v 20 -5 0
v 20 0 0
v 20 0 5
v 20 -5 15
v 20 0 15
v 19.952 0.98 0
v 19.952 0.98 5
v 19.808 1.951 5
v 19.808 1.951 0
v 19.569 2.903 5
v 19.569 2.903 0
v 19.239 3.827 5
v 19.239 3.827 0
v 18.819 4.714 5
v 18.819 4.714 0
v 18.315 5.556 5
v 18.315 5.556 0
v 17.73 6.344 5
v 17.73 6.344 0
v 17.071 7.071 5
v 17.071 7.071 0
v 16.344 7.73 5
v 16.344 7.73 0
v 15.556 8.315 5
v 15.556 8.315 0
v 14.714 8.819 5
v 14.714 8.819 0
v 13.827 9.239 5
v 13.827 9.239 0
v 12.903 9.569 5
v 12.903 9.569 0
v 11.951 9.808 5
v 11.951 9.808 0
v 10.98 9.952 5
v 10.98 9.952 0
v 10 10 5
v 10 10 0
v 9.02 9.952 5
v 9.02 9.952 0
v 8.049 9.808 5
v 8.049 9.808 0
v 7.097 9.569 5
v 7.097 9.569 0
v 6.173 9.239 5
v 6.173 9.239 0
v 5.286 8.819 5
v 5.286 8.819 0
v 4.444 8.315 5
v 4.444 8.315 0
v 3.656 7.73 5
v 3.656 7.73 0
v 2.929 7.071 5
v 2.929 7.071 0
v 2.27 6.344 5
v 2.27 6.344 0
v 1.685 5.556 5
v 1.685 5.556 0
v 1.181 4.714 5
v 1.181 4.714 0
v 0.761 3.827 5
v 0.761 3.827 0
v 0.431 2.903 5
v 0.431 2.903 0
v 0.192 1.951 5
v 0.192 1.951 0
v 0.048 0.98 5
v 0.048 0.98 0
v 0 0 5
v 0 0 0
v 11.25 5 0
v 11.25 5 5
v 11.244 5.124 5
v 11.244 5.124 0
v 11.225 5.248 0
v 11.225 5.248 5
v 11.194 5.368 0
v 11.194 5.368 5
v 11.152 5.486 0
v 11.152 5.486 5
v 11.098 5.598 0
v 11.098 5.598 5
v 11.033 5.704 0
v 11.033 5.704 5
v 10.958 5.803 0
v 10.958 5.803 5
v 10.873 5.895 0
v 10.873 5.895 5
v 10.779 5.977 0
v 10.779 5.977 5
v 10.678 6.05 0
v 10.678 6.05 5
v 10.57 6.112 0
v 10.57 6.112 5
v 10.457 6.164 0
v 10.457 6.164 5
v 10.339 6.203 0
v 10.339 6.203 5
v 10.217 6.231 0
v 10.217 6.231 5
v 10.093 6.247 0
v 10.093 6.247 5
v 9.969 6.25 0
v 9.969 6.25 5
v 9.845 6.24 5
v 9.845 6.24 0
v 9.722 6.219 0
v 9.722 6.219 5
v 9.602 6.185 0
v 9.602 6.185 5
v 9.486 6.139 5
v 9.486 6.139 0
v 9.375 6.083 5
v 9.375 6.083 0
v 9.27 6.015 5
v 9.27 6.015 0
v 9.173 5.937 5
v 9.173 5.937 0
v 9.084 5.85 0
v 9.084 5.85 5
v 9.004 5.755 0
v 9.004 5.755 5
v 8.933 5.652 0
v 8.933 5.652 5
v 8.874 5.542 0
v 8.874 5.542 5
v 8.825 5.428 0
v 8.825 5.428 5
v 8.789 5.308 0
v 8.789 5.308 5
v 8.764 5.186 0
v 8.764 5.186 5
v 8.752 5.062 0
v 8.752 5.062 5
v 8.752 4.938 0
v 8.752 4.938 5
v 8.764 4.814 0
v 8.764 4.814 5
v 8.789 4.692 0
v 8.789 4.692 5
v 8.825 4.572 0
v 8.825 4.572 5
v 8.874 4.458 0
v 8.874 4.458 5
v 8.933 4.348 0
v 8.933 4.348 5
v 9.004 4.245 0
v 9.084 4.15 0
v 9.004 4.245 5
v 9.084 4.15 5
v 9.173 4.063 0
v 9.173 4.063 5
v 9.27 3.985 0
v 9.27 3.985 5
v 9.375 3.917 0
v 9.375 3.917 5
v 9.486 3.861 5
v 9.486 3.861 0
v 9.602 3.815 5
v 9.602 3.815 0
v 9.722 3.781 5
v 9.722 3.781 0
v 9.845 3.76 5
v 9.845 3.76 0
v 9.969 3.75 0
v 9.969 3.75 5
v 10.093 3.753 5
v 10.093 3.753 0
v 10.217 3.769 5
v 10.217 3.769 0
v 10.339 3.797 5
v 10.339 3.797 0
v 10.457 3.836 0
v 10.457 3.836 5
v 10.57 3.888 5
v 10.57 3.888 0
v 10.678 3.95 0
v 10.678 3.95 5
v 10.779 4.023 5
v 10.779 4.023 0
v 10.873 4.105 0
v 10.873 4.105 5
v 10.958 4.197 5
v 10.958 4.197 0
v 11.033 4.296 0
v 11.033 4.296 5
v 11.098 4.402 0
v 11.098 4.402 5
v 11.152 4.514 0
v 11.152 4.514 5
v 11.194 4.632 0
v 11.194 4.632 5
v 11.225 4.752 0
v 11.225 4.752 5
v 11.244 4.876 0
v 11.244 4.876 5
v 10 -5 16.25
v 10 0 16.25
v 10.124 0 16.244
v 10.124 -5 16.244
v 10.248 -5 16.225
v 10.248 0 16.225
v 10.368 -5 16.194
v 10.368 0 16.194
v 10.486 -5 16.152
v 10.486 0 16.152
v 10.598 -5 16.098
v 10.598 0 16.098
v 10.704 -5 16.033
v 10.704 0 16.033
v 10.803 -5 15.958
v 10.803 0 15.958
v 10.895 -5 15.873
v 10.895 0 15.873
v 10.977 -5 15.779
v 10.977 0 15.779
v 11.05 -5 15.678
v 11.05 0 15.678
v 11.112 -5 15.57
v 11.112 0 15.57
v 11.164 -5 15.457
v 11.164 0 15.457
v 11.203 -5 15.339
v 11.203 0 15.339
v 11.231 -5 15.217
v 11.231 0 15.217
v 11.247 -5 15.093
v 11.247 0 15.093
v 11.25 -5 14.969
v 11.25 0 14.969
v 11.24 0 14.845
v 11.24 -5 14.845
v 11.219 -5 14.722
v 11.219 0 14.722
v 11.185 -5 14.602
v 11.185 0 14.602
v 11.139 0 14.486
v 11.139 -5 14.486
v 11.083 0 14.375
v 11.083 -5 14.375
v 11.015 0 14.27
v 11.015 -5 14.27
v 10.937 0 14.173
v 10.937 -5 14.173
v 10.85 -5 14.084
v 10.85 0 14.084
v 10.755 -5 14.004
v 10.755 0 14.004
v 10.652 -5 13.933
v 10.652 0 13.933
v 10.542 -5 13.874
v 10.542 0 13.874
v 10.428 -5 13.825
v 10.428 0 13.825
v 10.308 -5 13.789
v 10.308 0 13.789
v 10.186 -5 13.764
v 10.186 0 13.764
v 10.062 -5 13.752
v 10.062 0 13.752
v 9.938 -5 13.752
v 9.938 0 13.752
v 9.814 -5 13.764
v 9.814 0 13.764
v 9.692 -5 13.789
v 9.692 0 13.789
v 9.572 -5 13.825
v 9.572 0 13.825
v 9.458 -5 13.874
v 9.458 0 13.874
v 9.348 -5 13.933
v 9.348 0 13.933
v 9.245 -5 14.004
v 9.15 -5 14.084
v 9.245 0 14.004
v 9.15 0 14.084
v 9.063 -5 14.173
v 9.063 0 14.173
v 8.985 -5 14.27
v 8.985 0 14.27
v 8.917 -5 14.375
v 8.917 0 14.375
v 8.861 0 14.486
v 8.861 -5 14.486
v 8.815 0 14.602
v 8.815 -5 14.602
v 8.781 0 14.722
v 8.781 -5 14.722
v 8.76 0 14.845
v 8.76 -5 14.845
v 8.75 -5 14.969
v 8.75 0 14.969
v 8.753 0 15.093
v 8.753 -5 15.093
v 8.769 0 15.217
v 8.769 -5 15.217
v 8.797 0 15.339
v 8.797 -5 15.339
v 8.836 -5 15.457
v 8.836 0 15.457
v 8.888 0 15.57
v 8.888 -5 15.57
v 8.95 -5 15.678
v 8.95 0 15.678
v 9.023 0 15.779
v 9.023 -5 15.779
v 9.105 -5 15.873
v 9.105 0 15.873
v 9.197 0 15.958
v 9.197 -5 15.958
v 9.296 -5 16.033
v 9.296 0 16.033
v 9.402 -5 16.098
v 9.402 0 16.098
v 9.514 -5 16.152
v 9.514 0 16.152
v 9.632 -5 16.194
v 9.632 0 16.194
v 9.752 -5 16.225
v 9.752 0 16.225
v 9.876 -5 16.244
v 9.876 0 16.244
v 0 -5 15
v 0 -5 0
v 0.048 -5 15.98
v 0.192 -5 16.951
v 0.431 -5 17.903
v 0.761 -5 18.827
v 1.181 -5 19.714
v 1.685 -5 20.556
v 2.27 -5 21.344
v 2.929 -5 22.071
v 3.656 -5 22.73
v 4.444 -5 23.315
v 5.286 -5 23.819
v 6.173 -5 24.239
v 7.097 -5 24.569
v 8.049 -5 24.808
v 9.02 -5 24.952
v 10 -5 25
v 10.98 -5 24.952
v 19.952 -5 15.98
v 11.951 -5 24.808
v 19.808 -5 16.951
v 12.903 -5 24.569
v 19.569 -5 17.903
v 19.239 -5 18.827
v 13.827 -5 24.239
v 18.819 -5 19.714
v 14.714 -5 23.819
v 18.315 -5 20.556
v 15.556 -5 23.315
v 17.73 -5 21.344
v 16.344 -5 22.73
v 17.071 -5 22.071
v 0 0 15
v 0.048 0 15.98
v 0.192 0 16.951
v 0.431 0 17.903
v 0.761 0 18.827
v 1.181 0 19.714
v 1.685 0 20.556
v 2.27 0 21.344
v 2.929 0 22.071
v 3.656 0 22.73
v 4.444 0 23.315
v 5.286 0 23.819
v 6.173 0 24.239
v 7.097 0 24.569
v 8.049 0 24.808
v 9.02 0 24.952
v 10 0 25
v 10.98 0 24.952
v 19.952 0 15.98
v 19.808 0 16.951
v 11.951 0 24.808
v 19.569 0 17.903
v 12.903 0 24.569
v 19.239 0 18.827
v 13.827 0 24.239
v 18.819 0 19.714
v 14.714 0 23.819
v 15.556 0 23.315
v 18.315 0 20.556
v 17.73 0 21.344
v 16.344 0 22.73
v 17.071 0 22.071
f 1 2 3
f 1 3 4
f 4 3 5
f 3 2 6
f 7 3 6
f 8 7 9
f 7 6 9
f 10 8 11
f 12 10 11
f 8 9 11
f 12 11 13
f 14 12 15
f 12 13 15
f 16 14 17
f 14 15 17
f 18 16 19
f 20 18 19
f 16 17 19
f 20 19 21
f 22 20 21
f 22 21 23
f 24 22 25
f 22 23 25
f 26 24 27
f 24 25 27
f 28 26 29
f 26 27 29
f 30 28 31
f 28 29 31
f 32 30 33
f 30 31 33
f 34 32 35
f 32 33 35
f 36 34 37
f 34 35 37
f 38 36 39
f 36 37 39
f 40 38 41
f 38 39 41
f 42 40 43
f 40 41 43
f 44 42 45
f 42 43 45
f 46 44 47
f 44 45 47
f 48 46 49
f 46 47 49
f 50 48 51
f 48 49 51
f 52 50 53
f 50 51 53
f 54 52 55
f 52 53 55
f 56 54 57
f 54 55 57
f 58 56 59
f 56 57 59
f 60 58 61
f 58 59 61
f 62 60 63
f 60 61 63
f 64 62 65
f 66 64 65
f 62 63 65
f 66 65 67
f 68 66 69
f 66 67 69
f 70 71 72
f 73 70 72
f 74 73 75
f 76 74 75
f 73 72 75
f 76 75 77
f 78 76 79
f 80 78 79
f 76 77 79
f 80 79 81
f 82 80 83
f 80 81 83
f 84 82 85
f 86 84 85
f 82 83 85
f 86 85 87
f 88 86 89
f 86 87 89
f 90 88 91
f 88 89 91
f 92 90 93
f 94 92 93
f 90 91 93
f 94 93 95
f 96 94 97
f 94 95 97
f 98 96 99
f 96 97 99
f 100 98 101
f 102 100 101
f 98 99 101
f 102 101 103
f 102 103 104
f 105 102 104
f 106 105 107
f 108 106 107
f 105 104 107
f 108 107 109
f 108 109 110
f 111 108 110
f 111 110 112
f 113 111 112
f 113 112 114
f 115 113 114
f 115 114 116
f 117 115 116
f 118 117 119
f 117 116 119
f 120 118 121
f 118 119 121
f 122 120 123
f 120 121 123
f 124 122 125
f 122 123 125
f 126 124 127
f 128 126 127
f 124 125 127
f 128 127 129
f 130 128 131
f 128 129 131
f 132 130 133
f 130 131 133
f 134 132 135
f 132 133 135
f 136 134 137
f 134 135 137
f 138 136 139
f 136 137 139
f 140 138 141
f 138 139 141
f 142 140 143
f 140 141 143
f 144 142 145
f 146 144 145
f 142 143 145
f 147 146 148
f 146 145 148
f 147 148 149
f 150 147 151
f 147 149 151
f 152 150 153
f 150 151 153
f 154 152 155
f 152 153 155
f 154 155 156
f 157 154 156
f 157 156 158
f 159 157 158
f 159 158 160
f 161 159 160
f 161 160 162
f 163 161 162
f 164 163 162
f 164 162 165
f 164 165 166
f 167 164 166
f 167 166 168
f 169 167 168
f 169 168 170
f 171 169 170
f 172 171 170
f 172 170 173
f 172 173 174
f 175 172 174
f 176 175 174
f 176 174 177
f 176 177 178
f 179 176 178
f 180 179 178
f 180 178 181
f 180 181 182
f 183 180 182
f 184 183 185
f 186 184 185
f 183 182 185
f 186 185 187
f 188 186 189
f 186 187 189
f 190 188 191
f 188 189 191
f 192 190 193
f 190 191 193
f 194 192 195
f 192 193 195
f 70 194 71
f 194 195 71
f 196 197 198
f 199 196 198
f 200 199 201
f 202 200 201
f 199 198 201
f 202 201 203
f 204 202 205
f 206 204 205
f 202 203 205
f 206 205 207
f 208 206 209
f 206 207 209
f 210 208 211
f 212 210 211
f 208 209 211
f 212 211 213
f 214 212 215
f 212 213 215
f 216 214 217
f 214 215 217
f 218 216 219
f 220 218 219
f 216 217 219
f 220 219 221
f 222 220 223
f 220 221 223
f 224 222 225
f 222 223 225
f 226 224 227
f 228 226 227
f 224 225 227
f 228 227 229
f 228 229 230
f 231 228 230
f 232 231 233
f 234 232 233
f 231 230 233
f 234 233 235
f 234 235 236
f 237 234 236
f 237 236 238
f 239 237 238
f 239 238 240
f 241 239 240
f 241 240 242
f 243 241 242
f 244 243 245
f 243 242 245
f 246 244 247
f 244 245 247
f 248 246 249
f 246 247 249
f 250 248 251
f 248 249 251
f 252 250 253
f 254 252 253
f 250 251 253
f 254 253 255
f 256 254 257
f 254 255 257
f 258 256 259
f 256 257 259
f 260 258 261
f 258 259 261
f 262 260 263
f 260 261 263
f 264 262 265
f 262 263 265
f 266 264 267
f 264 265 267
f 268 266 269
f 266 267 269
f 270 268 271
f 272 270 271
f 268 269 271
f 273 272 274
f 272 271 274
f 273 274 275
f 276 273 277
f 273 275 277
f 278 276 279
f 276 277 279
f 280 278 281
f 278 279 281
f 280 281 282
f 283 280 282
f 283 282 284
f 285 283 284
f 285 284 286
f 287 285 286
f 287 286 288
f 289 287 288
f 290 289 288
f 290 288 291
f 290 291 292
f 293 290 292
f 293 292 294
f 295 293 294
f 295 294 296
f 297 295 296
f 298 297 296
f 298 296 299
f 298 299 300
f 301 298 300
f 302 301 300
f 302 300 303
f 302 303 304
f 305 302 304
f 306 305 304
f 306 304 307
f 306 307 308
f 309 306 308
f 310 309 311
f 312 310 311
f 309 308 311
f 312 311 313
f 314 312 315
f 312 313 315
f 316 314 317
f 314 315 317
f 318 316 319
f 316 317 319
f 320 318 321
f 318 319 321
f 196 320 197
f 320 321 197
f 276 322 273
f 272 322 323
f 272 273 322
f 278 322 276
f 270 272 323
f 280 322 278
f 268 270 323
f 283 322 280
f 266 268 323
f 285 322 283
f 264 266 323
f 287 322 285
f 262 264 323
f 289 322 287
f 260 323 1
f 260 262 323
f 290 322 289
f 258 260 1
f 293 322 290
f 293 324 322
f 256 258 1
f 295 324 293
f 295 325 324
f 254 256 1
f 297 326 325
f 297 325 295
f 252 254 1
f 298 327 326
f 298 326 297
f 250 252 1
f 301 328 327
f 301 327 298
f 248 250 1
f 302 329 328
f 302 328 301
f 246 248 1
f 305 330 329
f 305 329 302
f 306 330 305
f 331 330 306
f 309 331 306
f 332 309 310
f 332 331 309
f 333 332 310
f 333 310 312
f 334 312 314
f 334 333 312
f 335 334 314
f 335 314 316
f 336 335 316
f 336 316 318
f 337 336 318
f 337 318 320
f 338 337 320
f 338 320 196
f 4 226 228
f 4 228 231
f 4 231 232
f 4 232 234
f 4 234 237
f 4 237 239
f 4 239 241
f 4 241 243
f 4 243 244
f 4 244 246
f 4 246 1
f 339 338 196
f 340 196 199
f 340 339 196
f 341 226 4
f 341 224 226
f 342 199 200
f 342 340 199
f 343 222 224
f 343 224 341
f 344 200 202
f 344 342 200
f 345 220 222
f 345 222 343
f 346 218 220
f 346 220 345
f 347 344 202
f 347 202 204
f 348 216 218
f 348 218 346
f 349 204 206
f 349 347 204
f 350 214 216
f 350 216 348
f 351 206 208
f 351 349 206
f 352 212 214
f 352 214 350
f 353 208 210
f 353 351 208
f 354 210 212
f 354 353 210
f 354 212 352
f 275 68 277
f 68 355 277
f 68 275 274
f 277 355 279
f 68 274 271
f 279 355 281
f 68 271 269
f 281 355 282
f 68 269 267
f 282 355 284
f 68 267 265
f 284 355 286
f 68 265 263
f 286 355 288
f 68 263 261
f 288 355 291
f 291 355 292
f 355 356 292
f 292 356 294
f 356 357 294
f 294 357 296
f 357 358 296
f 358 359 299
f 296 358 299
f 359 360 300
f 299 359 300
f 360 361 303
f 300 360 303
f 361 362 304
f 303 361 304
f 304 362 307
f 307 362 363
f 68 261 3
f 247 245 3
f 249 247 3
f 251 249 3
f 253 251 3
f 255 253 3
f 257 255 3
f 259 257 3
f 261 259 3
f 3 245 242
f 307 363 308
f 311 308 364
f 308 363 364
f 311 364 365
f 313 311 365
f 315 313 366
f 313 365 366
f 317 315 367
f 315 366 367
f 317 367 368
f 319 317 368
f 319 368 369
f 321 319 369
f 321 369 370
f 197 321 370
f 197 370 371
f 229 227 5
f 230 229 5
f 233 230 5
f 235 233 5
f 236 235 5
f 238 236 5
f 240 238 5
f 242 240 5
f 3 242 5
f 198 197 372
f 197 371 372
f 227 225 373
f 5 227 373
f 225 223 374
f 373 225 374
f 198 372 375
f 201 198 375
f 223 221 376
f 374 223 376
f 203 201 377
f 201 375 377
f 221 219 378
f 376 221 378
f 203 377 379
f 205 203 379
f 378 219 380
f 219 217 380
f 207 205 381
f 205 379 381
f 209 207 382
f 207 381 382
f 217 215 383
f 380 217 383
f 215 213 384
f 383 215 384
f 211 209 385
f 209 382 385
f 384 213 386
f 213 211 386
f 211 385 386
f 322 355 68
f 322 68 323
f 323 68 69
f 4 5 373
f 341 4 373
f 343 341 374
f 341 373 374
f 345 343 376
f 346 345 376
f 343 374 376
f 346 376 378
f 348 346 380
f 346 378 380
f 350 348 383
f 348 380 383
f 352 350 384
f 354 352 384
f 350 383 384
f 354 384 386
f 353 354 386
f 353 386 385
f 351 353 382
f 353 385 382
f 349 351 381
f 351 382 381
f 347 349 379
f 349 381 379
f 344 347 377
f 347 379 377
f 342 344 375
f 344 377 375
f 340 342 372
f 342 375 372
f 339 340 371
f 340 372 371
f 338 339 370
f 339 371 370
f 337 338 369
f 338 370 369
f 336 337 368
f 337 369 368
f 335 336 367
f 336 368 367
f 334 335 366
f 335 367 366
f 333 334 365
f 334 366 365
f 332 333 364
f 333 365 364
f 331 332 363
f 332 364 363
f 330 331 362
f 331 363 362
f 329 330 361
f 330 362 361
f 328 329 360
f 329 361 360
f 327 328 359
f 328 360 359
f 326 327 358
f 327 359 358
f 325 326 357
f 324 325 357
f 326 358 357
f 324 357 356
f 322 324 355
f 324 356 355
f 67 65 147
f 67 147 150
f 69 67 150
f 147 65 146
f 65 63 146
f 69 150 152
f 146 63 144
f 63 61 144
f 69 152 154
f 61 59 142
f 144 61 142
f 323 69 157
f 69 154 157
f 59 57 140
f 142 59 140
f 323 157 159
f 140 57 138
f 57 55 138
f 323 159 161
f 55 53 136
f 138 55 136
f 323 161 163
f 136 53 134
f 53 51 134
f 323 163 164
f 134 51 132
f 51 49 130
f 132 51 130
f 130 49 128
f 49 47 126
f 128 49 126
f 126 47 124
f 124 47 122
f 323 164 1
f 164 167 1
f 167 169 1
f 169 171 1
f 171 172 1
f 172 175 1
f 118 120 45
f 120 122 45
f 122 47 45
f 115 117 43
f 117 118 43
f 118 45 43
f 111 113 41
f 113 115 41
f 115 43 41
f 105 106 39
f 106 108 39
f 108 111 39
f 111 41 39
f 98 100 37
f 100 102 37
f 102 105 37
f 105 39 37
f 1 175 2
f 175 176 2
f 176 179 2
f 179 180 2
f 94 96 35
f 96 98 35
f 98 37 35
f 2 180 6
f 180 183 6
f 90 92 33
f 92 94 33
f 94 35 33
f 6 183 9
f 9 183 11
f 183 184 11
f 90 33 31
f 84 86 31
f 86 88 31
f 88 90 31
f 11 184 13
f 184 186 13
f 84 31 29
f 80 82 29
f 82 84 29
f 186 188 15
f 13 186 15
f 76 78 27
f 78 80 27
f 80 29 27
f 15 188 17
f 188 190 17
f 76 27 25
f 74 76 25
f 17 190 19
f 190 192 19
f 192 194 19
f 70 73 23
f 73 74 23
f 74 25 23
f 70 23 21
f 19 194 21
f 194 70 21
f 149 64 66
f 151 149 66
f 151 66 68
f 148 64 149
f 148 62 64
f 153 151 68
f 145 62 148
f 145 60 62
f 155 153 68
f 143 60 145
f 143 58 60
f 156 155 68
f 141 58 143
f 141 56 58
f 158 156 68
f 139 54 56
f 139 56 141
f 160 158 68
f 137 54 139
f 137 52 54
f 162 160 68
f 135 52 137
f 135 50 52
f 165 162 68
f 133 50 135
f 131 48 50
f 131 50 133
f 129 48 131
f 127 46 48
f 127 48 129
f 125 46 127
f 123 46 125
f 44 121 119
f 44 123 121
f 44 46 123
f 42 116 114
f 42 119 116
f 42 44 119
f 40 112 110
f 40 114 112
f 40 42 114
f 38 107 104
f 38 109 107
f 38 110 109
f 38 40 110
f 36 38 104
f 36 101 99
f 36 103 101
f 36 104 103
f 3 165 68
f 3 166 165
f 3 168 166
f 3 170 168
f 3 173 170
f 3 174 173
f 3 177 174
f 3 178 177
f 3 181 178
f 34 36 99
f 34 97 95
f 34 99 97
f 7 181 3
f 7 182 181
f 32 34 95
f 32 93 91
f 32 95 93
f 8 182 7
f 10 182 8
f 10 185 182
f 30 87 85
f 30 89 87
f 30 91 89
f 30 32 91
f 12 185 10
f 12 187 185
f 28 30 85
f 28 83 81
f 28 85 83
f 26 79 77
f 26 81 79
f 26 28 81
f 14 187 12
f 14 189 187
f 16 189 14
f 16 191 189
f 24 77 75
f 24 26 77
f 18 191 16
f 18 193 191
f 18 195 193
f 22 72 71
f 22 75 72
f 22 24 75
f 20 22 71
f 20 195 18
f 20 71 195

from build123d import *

# Parameters (mm, degrees)
Y_KSEKLIK_EKSTR_ZYON1_DEPTH = 5
Y_KSEKLIK_EKSTR_ZYON2_DEPTH = 5
IZIM3_R                     = 1.25
KES_EKSTR_ZYON1_DEPTH       = 5
IZIM4_R                     = 1.25
KES_EKSTR_ZYON2_DEPTH       = 5


with BuildPart() as part:
    # Çizim1 → Yükseklik-Ekstrüzyon1 (new body)
    with BuildSketch(Plane.XY):
        with BuildLine():
            Line((0, 0), (20, 0))
            ThreePointArc((20, 0), (10, 10), (0, 0))
        make_face()
    extrude(amount=Y_KSEKLIK_EKSTR_ZYON1_DEPTH)

    # Çizim2 → Yükseklik-Ekstrüzyon2 (add)
    with BuildSketch(Plane.XZ):
        with BuildLine():
            Line((0, 15), (0, 0))
            Line((0, 0), (20, 0))
            Line((20, 0), (20, 15))
            ThreePointArc((20, 15), (10, 25), (0, 15))
        make_face()
    extrude(amount=Y_KSEKLIK_EKSTR_ZYON2_DEPTH)

    # Çizim3 → Kes-Ekstrüzyon1 (cut)
    with BuildSketch(Plane.XY.offset(5)):
        with Locations((10, 5)):
            Circle(IZIM3_R)
    extrude(amount=-KES_EKSTR_ZYON1_DEPTH, mode=Mode.SUBTRACT)

    # Çizim4 → Kes-Ekstrüzyon2 (cut)
    with BuildSketch(Plane(origin=(0, 0, 0), x_dir=(1, 0, 0), z_dir=(0, 1, 0))):
        with Locations(Location((10, -15, 0), (0, 0, 270))):
            Circle(IZIM4_R)
    extrude(amount=-KES_EKSTR_ZYON2_DEPTH, mode=Mode.SUBTRACT)


solid = part.part
